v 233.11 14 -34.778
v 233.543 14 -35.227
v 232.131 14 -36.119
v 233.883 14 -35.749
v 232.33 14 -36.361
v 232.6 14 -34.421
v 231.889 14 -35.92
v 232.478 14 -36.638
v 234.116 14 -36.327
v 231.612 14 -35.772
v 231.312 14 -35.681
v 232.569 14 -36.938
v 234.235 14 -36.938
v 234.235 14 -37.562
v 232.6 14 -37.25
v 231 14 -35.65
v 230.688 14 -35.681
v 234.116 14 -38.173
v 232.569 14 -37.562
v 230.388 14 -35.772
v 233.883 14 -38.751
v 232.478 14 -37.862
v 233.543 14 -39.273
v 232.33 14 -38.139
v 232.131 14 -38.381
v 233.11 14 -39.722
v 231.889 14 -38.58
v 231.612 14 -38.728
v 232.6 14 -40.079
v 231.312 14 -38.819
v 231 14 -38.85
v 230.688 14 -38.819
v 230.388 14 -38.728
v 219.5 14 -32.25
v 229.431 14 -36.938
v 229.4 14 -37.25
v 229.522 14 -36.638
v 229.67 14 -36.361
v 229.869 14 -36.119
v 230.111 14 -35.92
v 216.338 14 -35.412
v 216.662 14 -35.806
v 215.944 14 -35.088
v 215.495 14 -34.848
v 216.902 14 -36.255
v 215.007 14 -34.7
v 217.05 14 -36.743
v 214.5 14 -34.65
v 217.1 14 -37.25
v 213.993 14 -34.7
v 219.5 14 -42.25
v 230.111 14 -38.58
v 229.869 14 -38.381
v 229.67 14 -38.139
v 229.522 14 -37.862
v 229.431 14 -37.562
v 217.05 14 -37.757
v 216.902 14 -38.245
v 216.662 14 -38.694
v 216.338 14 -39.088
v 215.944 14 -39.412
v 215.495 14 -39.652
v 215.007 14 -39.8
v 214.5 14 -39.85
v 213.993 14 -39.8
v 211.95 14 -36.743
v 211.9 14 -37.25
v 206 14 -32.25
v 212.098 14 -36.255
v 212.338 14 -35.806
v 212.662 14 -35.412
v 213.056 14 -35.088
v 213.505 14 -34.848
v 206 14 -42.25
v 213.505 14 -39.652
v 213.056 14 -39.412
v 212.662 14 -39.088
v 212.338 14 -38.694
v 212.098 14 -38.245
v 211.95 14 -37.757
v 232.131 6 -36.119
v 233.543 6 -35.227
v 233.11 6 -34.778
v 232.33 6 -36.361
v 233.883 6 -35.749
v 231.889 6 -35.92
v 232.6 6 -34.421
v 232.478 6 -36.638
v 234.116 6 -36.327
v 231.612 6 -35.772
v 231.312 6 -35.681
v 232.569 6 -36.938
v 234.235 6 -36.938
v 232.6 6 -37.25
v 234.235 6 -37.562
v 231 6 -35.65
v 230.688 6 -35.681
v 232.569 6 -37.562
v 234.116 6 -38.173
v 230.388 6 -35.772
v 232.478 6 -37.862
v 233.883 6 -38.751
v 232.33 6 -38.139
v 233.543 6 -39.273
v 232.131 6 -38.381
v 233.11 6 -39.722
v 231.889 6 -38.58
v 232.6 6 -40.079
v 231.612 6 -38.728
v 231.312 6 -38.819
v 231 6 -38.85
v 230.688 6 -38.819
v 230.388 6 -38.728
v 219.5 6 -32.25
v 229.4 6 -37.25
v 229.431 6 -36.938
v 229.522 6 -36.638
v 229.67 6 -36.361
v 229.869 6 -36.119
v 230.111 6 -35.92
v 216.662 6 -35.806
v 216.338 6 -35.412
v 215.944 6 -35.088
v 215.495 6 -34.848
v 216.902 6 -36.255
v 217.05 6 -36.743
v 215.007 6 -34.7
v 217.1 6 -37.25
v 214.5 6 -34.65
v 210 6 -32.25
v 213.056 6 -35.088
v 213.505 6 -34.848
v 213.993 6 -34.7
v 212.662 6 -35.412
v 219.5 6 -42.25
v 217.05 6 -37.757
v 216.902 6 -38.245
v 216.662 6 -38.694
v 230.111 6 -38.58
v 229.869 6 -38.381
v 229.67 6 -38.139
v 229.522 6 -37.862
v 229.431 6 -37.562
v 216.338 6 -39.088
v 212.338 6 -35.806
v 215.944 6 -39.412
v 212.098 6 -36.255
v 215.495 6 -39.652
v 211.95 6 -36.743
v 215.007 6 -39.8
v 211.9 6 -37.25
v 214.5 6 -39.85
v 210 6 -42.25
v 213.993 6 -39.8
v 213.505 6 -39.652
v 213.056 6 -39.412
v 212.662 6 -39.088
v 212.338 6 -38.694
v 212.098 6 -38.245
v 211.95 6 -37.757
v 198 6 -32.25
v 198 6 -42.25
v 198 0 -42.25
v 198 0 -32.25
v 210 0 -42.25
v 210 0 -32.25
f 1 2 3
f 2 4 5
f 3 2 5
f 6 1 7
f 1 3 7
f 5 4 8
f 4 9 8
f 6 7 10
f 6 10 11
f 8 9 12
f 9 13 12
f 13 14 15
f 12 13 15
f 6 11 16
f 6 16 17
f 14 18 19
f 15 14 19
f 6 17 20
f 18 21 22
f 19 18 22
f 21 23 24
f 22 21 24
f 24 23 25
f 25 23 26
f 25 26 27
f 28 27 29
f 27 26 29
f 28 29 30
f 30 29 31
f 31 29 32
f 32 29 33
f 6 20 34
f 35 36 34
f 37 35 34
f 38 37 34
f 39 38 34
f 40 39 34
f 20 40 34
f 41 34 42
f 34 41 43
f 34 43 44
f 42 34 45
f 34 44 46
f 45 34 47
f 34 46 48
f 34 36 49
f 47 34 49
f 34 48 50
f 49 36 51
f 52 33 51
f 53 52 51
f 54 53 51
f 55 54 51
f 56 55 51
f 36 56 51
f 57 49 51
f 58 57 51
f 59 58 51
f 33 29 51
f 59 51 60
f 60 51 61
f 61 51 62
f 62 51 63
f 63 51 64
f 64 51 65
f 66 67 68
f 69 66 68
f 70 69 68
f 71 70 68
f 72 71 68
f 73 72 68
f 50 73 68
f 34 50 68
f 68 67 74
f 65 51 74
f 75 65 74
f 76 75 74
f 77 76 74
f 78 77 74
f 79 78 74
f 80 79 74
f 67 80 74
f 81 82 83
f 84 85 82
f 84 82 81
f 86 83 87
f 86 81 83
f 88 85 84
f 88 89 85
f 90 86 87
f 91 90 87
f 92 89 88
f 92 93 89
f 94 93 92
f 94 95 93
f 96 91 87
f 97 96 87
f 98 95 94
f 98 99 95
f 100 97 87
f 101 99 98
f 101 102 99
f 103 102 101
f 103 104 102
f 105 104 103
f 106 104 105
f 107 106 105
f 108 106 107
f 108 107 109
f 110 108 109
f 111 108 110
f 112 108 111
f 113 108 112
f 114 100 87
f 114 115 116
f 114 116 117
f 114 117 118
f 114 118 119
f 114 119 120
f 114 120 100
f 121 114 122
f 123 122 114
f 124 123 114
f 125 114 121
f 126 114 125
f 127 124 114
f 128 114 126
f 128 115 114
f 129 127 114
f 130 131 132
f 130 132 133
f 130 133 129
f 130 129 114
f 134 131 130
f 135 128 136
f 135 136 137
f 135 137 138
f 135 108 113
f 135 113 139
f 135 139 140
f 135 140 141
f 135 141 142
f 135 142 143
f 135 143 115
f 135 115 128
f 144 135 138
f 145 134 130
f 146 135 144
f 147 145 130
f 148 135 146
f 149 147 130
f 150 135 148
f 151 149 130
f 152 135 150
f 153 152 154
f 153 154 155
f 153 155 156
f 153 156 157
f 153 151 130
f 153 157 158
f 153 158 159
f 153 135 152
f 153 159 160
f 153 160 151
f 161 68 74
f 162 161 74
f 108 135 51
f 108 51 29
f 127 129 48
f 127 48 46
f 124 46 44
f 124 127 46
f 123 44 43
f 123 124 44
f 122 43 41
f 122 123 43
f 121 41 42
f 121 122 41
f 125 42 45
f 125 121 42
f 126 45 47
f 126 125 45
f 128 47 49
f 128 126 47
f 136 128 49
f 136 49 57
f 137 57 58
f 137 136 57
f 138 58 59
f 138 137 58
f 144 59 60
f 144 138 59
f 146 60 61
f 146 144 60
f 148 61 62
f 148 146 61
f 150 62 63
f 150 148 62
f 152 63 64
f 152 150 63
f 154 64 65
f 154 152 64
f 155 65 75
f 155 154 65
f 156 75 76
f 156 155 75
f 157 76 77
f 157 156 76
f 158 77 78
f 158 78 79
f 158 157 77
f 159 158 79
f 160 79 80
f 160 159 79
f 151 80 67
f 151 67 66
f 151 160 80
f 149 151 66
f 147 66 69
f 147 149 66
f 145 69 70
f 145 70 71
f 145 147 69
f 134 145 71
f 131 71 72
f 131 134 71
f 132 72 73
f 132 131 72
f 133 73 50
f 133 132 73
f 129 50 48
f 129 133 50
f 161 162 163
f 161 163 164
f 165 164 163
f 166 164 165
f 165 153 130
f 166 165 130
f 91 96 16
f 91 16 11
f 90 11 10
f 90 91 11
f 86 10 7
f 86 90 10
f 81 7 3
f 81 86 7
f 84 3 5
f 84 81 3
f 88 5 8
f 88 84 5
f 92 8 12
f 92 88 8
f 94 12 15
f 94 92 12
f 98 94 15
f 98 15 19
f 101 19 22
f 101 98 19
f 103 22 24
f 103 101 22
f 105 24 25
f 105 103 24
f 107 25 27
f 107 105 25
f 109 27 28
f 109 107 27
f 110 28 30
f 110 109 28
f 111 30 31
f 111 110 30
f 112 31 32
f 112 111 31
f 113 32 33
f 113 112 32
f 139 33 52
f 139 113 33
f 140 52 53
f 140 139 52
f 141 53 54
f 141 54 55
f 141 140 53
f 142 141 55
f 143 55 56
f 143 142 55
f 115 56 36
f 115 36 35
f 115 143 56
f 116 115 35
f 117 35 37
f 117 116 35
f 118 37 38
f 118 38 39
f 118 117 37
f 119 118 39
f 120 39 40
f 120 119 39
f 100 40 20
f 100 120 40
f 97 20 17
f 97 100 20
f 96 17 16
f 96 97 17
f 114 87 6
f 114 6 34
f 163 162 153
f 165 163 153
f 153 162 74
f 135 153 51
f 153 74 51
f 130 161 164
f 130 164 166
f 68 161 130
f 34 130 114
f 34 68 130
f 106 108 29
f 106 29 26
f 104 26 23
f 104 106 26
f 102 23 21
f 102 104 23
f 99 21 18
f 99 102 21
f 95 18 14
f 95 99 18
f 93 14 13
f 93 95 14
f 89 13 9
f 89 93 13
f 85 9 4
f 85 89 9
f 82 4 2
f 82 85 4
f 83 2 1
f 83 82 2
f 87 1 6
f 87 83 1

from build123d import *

# Parameters (mm, degrees)
SKETCH1_R             = 5.9875
SKETCH1_R_2           = 1.7
SKETCH1_R_3           = 1.6
BOSS_EXTRUDE1_DEPTH   = 6
MOVE_FACE1_BY         = 5
MOVE_FACE1_2_BY       = 5
MOVE_FACE1_3_BY       = 5
MOVE_FACE1_4_BY       = 5
M4X0_7_TAPPED_HOLE2_D = 3.3
POCKET_WALLS_DEPTH    = 2.6
RIB_PATTERN_DEPTH     = 3
MOVE_FACE2_BY         = 4.5
MOVE_FACE2_2_BY       = 4.5
MOVE_FACE2_3_BY       = 4.5
MOVE_FACE2_4_BY       = 4.5
MOVE_FACE2_5_BY       = 4.5
MOVE_FACE2_6_BY       = 4.5
MOVE_FACE2_7_BY       = 4.5
MOVE_FACE2_8_BY       = 4.5
MOVE_FACE2_9_BY       = 4.5
MOVE_FACE2_10_BY      = 4.5
MOVE_FACE2_11_BY      = 4.5
MOVE_FACE2_12_BY      = 4.5
MOVE_FACE2_13_BY      = 4.5
MOVE_FACE2_14_BY      = 4.5
BOSS_EXTRUDE6_REACH   = 382.427
SKETCH19_W            = 1
SKETCH19_H            = 3
BOSS_EXTRUDE7_REACH   = 375.768
SKETCH20_W            = 1
SKETCH20_H            = 3
CUT_EXTRUDE4_DEPTH    = 4.5
POCKET_FILLETS_R      = 2.5
FILLET9_R             = 3
MOVE_FACE3_BY         = 12
MOVE_FACE3_2_BY       = 12
SKETCH23_W            = 12
SKETCH23_H            = 38.175
CUT_EXTRUDE5_DEPTH    = 245.489391385
MOVE_FACE4_BY         = 4
MOVE_FACE4_2_BY       = 4
FILLET6_R             = 5
FILLET7_R             = 11
FILLET8_START         = -1
FILLET8_DEPTH         = 8
FILLET8_2_DEPTH       = 6
SKETCH25_R            = 1.6
SKETCH25_R_2          = 2.6
BOSS_EXTRUDE9_DEPTH   = 8
SKETCH26_W            = 12
SKETCH26_H            = 10
BOSS_EXTRUDE10_DEPTH  = 6
CHAMFER2_SIZE         = 8


with BuildPart() as part:
    # Sketch1 → Boss-Extrude1 (new body)
    with BuildSketch(Plane(origin=(0, 0, 0), x_dir=(1, 0, 0), z_dir=(0, 1, 0))):
        Polygon((-240, 46.25), (-198, 46.25), (-198, 26.5), (198, 26.5), (198, 46.25), (240, 46.25), (240, -18.75), (201, -18.75), (201, 0), (-201, 0), (-201, -18.75), (-240, -18.75), align=None)
        with Locations(Location((-231, 24.425, 0), (0, 0, 270))):
            Circle(SKETCH1_R, mode=Mode.SUBTRACT)
        with Locations(Location((-214.5, 37.25, 0), (0, 0, 270))):
            Circle(SKETCH1_R, mode=Mode.SUBTRACT)
        with Locations(Location((214.5, 37.25, 0), (0, 0, 90))):
            Circle(SKETCH1_R, mode=Mode.SUBTRACT)
        with Locations(Location((231, 24.425, 0), (0, 0, 90))):
            Circle(SKETCH1_R, mode=Mode.SUBTRACT)
        with Locations(Location((-204.5, -6.05, 0), (0, 0, 270))):
            Circle(SKETCH1_R_2, mode=Mode.SUBTRACT)
        with Locations(Location((-224.5, -6.05, 0), (0, 0, 270))):
            Circle(SKETCH1_R_2, mode=Mode.SUBTRACT)
        with Locations(Location((-204.5, 13.95, 0), (0, 0, 270))):
            Circle(SKETCH1_R_2, mode=Mode.SUBTRACT)
        with Locations(Location((-224.5, 13.95, 0), (0, 0, 270))):
            Circle(SKETCH1_R_2, mode=Mode.SUBTRACT)
        with Locations(Location((204.5, -6.05, 0), (0, 0, 90))):
            Circle(SKETCH1_R_2, mode=Mode.SUBTRACT)
        with Locations(Location((204.5, 13.95, 0), (0, 0, 90))):
            Circle(SKETCH1_R_2, mode=Mode.SUBTRACT)
        with Locations(Location((224.5, 13.95, 0), (0, 0, 90))):
            Circle(SKETCH1_R_2, mode=Mode.SUBTRACT)
        with Locations(Location((224.5, -6.05, 0), (0, 0, 90))):
            Circle(SKETCH1_R_2, mode=Mode.SUBTRACT)
        with Locations(Location((-187.5, 13.25, 0), (0, 0, 270))):
            Circle(SKETCH1_R_3, mode=Mode.SUBTRACT)
        with Locations(Location((-162.5, 13.25, 0), (0, 0, 270))):
            Circle(SKETCH1_R_3, mode=Mode.SUBTRACT)
        with Locations(Location((-137.5, 13.25, 0), (0, 0, 270))):
            Circle(SKETCH1_R_3, mode=Mode.SUBTRACT)
        with Locations(Location((-112.5, 13.25, 0), (0, 0, 270))):
            Circle(SKETCH1_R_3, mode=Mode.SUBTRACT)
        with Locations(Location((-87.5, 13.25, 0), (0, 0, 270))):
            Circle(SKETCH1_R_3, mode=Mode.SUBTRACT)
        with Locations(Location((-62.5, 13.25, 0), (0, 0, 270))):
            Circle(SKETCH1_R_3, mode=Mode.SUBTRACT)
        with Locations(Location((-37.5, 13.25, 0), (0, 0, 270))):
            Circle(SKETCH1_R_3, mode=Mode.SUBTRACT)
        with Locations(Location((-12.5, 13.25, 0), (0, 0, 270))):
            Circle(SKETCH1_R_3, mode=Mode.SUBTRACT)
        with Locations(Location((12.5, 13.25, 0), (0, 0, 270))):
            Circle(SKETCH1_R_3, mode=Mode.SUBTRACT)
        with Locations(Location((37.5, 13.25, 0), (0, 0, 270))):
            Circle(SKETCH1_R_3, mode=Mode.SUBTRACT)
        with Locations(Location((62.5, 13.25, 0), (0, 0, 270))):
            Circle(SKETCH1_R_3, mode=Mode.SUBTRACT)
        with Locations(Location((87.5, 13.25, 0), (0, 0, 270))):
            Circle(SKETCH1_R_3, mode=Mode.SUBTRACT)
        with Locations(Location((112.5, 13.25, 0), (0, 0, 270))):
            Circle(SKETCH1_R_3, mode=Mode.SUBTRACT)
        with Locations(Location((137.5, 13.25, 0), (0, 0, 270))):
            Circle(SKETCH1_R_3, mode=Mode.SUBTRACT)
        with Locations(Location((-231, 37.25, 0), (0, 0, 270))):
            Circle(SKETCH1_R_3, mode=Mode.SUBTRACT)
        with Locations(Location((231, 37.25, 0), (0, 0, 90))):
            Circle(SKETCH1_R_3, mode=Mode.SUBTRACT)
        with Locations(Location((162.5, 13.25, 0), (0, 0, 270))):
            Circle(SKETCH1_R_3, mode=Mode.SUBTRACT)
        with Locations(Location((187.5, 13.25, 0), (0, 0, 270))):
            Circle(SKETCH1_R_3, mode=Mode.SUBTRACT)
    extrude(amount=BOSS_EXTRUDE1_DEPTH)

    # Move Face1: a curved face moved outward by 5.0
    add(Solid.thicken(part.faces().sort_by_distance((231, 3, -18.4375))[0], MOVE_FACE1_BY))

    # Move Face1 2: a curved face moved outward by 5.0
    add(Solid.thicken(part.faces().sort_by_distance((214.5, 3, -31.2625))[0], MOVE_FACE1_2_BY))

    # Move Face1 3: a curved face moved outward by 5.0
    add(Solid.thicken(part.faces().sort_by_distance((-214.5, 3, -43.2375))[0], MOVE_FACE1_3_BY))

    # Move Face1 4: a curved face moved outward by 5.0
    add(Solid.thicken(part.faces().sort_by_distance((-231, 3, -30.4125))[0], MOVE_FACE1_4_BY))

    # M4x0.7 Tapped Hole2 (through all)
    with Locations(Plane(origin=(0, 6, 0), x_dir=(1, 0, 0), z_dir=(0, 1, 0))):
        with Locations((-214.5, 37.25), (-231, 24.425), (231, 24.425), (214.5, 37.25)):
            Hole(M4X0_7_TAPPED_HOLE2_D / 2)

    # Sketch13 → Pocket Walls (add)
    with BuildSketch(Plane.XY):
        Polygon((-214, 6), (-208.803847577, 9), (208.803847577, 9), (214, 6), align=None)
    pocket_walls = extrude(amount=-POCKET_WALLS_DEPTH)

    # Mirror1: Pocket Walls across plane
    add(pocket_walls.mirror(Plane.XY.offset(-13.25)))

    # zig_zag_style_1 → Rib Pattern (add)
    with BuildSketch(Plane(origin=(0, 6, 0), x_dir=(1, 0, 0), z_dir=(0, 1, 0))):
        Polygon((-186.851468198, 1.838812439), (-162.5, 22.586263345), (-137.5, 1.286263345), (-112.5, 22.586263345), (-87.5, 1.286263345), (-62.5, 22.586263345), (-37.5, 1.286263345), (-12.5, 22.586263345), (12.5, 1.286263345), (37.5, 22.586263345), (62.5, 1.286263345), (87.5, 22.586263345), (112.5, 1.286263345), (137.5, 22.586263345), (162.5, 1.286263345), (188.148531802, 23.138812439), (186.851468198, 24.661187561), (162.5, 3.913736655), (137.5, 25.213736655), (112.5, 3.913736655), (87.5, 25.213736655), (62.5, 3.913736655), (37.5, 25.213736655), (12.5, 3.913736655), (-12.5, 25.213736655), (-37.5, 3.913736655), (-62.5, 25.213736655), (-87.5, 3.913736655), (-112.5, 25.213736655), (-137.5, 3.913736655), (-162.5, 25.213736655), (-188.148531802, 3.361187561), align=None)
    extrude(amount=RIB_PATTERN_DEPTH)

    # Move Face2: a face moved inward by 4.5
    extrude(part.faces().sort_by_distance((162.5, 6, -17.307514961))[0], amount=MOVE_FACE2_BY, dir=(0, -1, 0), mode=Mode.SUBTRACT)

    # Move Face2 2: a face moved inward by 4.5
    extrude(part.faces().sort_by_distance((137.5, 6, -9.192485039))[0], amount=MOVE_FACE2_2_BY, dir=(0, -1, 0), mode=Mode.SUBTRACT)

    # Move Face2 3: a face moved inward by 4.5
    extrude(part.faces().sort_by_distance((112.5, 6, -17.307514961))[0], amount=MOVE_FACE2_3_BY, dir=(0, -1, 0), mode=Mode.SUBTRACT)

    # Move Face2 4: a face moved inward by 4.5
    extrude(part.faces().sort_by_distance((87.5, 6, -9.192485039))[0], amount=MOVE_FACE2_4_BY, dir=(0, -1, 0), mode=Mode.SUBTRACT)

    # Move Face2 5: a face moved inward by 4.5
    extrude(part.faces().sort_by_distance((62.5, 6, -17.307514961))[0], amount=MOVE_FACE2_5_BY, dir=(0, -1, 0), mode=Mode.SUBTRACT)

    # Move Face2 6: a face moved inward by 4.5
    extrude(part.faces().sort_by_distance((37.5, 6, -9.192485039))[0], amount=MOVE_FACE2_6_BY, dir=(0, -1, 0), mode=Mode.SUBTRACT)

    # Move Face2 7: a face moved inward by 4.5
    extrude(part.faces().sort_by_distance((12.5, 6, -17.307514961))[0], amount=MOVE_FACE2_7_BY, dir=(0, -1, 0), mode=Mode.SUBTRACT)

    # Move Face2 8: a face moved inward by 4.5
    extrude(part.faces().sort_by_distance((-12.5, 6, -9.192485039))[0], amount=MOVE_FACE2_8_BY, dir=(0, -1, 0), mode=Mode.SUBTRACT)

    # Move Face2 9: a face moved inward by 4.5
    extrude(part.faces().sort_by_distance((-37.5, 6, -17.307514961))[0], amount=MOVE_FACE2_9_BY, dir=(0, -1, 0), mode=Mode.SUBTRACT)

    # Move Face2 10: a face moved inward by 4.5
    extrude(part.faces().sort_by_distance((-62.5, 6, -9.192485039))[0], amount=MOVE_FACE2_10_BY, dir=(0, -1, 0), mode=Mode.SUBTRACT)

    # Move Face2 11: a face moved inward by 4.5
    extrude(part.faces().sort_by_distance((-87.5, 6, -17.307514961))[0], amount=MOVE_FACE2_11_BY, dir=(0, -1, 0), mode=Mode.SUBTRACT)

    # Move Face2 12: a face moved inward by 4.5
    extrude(part.faces().sort_by_distance((-112.5, 6, -9.192485039))[0], amount=MOVE_FACE2_12_BY, dir=(0, -1, 0), mode=Mode.SUBTRACT)

    # Move Face2 13: a face moved inward by 4.5
    extrude(part.faces().sort_by_distance((-162.5, 6, -9.192485039))[0], amount=MOVE_FACE2_13_BY, dir=(0, -1, 0), mode=Mode.SUBTRACT)

    # Move Face2 14: a face moved inward by 4.5
    extrude(part.faces().sort_by_distance((-137.5, 6, -17.307514961))[0], amount=MOVE_FACE2_14_BY, dir=(0, -1, 0), mode=Mode.SUBTRACT)

    # Boss-Extrude6: up to this face of the body (flat: up to its plane)
    boss_extrude6_end = Plane(part.part.faces().sort_by_distance((199.498029235, 7.445651316, -23.9))[0])
    # Sketch19 → Boss-Extrude6 (add, up to the picked face)
    with BuildSketch(Plane(origin=(120.437057913, 0, -102.612373342), x_dir=(-0.6485318015860708, 0, -0.7611875605470214), z_dir=(0.7611875605470213, 0, -0.6485318015860707)), mode=Mode.PRIVATE) as boss_extrude6_sk1:
        with Locations((-103.9073301, 7.5)):
            Rectangle(SKETCH19_W, SKETCH19_H)
    boss_extrude6_tool1 = split(extrude(boss_extrude6_sk1.sketch, amount=BOSS_EXTRUDE6_REACH, mode=Mode.PRIVATE), bisect_by=boss_extrude6_end, keep=Keep.BOTH, mode=Mode.PRIVATE)
    add(boss_extrude6_tool1.solids().sort_by(Axis((187.824266, 7.5, -23.519406), (0.7611875605470213, 0, -0.6485318015860707)))[0])

    # Boss-Extrude7: up to this face of the body (flat: up to its plane)
    boss_extrude7_end = Plane(part.part.faces().sort_by_distance((-199.498029235, 7.445651316, -2.6))[0])
    # Sketch20 → Boss-Extrude7 (add, up to the picked face)
    with BuildSketch(Plane(origin=(-107.355217903, 0, 91.466645654), x_dir=(0.6485318015860708, 0, 0.7611875605470213), z_dir=(-0.7611875605470213, 0, 0.6485318015860708)), mode=Mode.PRIVATE) as boss_extrude7_sk1:
        with Locations((-124.078800455, 7.5)):
            Rectangle(SKETCH20_W, SKETCH20_H)
    boss_extrude7_tool1 = split(extrude(boss_extrude7_sk1.sketch, amount=BOSS_EXTRUDE7_REACH, mode=Mode.PRIVATE), bisect_by=boss_extrude7_end, keep=Keep.BOTH, mode=Mode.PRIVATE)
    add(boss_extrude7_tool1.solids().sort_by(Axis((-187.824266, 7.5, -2.980594), (-0.7611875605470213, 0, 0.6485318015860708)))[0])

    # Sketch22 → Cut-Extrude4 (cut)
    with BuildSketch(Plane(origin=(0, 6, 0), x_dir=(1, 0, 0), z_dir=(0, 1, 0))):
        Polygon((-201, 2.6), (-201, 23.9), (-164.041944431, 23.9), (-189.041944431, 2.6), align=None)
        Polygon((201, 2.6), (201, 23.9), (189.041944431, 23.9), (164.041944431, 2.6), align=None)
    extrude(amount=-CUT_EXTRUDE4_DEPTH, mode=Mode.SUBTRACT)

    # Pocket FIllets
    pocket_fillets_edges = [part.edges().sort_by_distance(p)[0] for p in [
        (185.958055569, 5.25, -23.9),
        (139.041944431, 5.25, -23.9),
        (135.958055569, 5.25, -23.9),
        (89.041944431, 5.25, -23.9),
        (85.958055569, 5.25, -23.9),
        (39.041944431, 5.25, -23.9),
        (35.958055569, 5.25, -23.9),
        (-10.958055569, 5.25, -23.9),
        (-14.041944431, 5.25, -23.9),
        (-60.958055569, 5.25, -23.9),
        (-64.041944431, 5.25, -23.9),
        (-110.958055569, 5.25, -23.9),
        (-114.041944431, 5.25, -23.9),
        (-160.958055569, 5.25, -23.9),
        (-164.041944431, 5.25, -23.9),
        (164.041944431, 5.25, -2.6),
        (-185.958055569, 5.25, -2.6),
        (-139.041944431, 5.25, -2.6),
        (-135.958055569, 5.25, -2.6),
        (-89.041944431, 5.25, -2.6),
        (-85.958055569, 5.25, -2.6),
        (-39.041944431, 5.25, -2.6),
        (-35.958055569, 5.25, -2.6),
        (10.958055569, 5.25, -2.6),
        (14.041944431, 5.25, -2.6),
        (60.958055569, 5.25, -2.6),
        (64.041944431, 5.25, -2.6),
        (110.958055569, 5.25, -2.6),
        (114.041944431, 5.25, -2.6),
        (160.958055569, 5.25, -2.6),
        (137.5, 5.25, -22.586263345),
        (87.5, 5.25, -22.586263345),
        (37.5, 5.25, -22.586263345),
        (-12.5, 5.25, -22.586263345),
        (-62.5, 5.25, -22.586263345),
        (-112.5, 5.25, -22.586263345),
        (-162.5, 5.25, -22.586263345),
        (-137.5, 5.25, -3.913736655),
        (-87.5, 5.25, -3.913736655),
        (-37.5, 5.25, -3.913736655),
        (12.5, 5.25, -3.913736655),
        (62.5, 5.25, -3.913736655),
        (112.5, 5.25, -3.913736655),
        (162.5, 5.25, -3.913736655),
        (189.041944431, 5.25, -23.9),
        (-189.041944431, 5.25, -2.6),
    ]]
    fillet(pocket_fillets_edges, radius=POCKET_FILLETS_R)

    # Fillet9
    fillet9_edges = [part.edges().sort_by_distance(p)[0] for p in [
        (-201, 3.75, -2.6),
        (-201, 3.75, -23.9),
        (201, 3.75, -2.6),
        (201, 3.75, -23.9),
    ]]
    fillet(fillet9_edges, radius=FILLET9_R)

    # Move Face3: a face moved inward by 12.0
    extrude(part.faces().sort_by_distance((198, 3, -36.375))[0], amount=MOVE_FACE3_BY, dir=(1, 0, 0), mode=Mode.SUBTRACT)

    # Move Face3 2: a face moved inward by 12.0
    extrude(part.faces().sort_by_distance((-198, 3, -36.375))[0], amount=MOVE_FACE3_2_BY, dir=(-1, 0, 0), mode=Mode.SUBTRACT)

    # Sketch23 → Cut-Extrude5 (cut, through all)
    with BuildSketch(Plane(origin=(0, 6, 0), x_dir=(1, 0, 0), z_dir=(0, 1, 0))):
        with Locations((-234, 0.3375)):
            Rectangle(SKETCH23_W, SKETCH23_H)
        with Locations((234, 0.3375)):
            Rectangle(SKETCH23_W, SKETCH23_H)
    extrude(amount=-CUT_EXTRUDE5_DEPTH, mode=Mode.SUBTRACT)

    # Move Face4: a face moved inward by 4.0
    extrude(part.faces().sort_by_distance((-240, 3, -32.8375))[0], amount=MOVE_FACE4_BY, dir=(1, 0, 0), mode=Mode.SUBTRACT)

    # Move Face4 2: a face moved inward by 4.0
    extrude(part.faces().sort_by_distance((240, 3, -32.8375))[0], amount=MOVE_FACE4_2_BY, dir=(-1, 0, 0), mode=Mode.SUBTRACT)

    # Fillet6
    fillet6_edges = [part.edges().sort_by_distance(p)[0] for p in [
        (-210, 3, -46.25),
        (-210, 3, -26.5),
        (210, 3, -26.5),
        (210, 3, -46.25),
        (201, 3, 18.75),
        (201, 3, 0),
        (-201, 3, 0),
        (-201, 3, 18.75),
        (-228, 3, 18.75),
        (228, 3, 18.75),
    ]]
    fillet(fillet6_edges, radius=FILLET6_R)

    # Fillet7
    fillet7_edges = [part.edges().sort_by_distance(p)[0] for p in [
        (-236, 3, -46.25),
        (236, 3, -46.25),
    ]]
    fillet(fillet7_edges, radius=FILLET7_R)

    # Fillet8: read off the stored shape, not the designer's step
    # Fillet8 outline → Fillet8 (cut)
    with BuildSketch(Plane(origin=(0, 0, 0), x_dir=(1, 0, 0), z_dir=(0, 1, 0)).offset(FILLET8_START)):
        with BuildLine():
            Line((-236, 19.425), (-232, 19.425))
            ThreePointArc((-232, 19.425), (-234.828427125, 20.596572875), (-236, 23.425))
            Line((-236, 23.425), (-236, 19.425))
        make_face()
        with BuildLine():
            ThreePointArc((236, 23.425), (234.828427125, 20.596572875), (232, 19.425))
            Line((232, 19.425), (236, 19.425))
            Line((236, 19.425), (236, 23.425))
        make_face()
    extrude(amount=FILLET8_DEPTH, mode=Mode.SUBTRACT)

    # Fillet8 2 outline → Fillet8 2 (add)
    with BuildSketch(Plane(origin=(0, 0, 0), x_dir=(1, 0, 0), z_dir=(0, 1, 0))):
        with BuildLine():
            Line((-228, 19.425), (-232, 19.425))
            ThreePointArc((-232, 19.425), (-229.171572875, 18.253427125), (-228, 15.425))
            Line((-228, 15.425), (-228, 19.425))
        make_face()
        with BuildLine():
            Line((228, 19.425), (228, 15.425))
            ThreePointArc((228, 15.425), (229.171572875, 18.253427125), (232, 19.425))
            Line((232, 19.425), (228, 19.425))
        make_face()
    extrude(amount=FILLET8_2_DEPTH)


with BuildPart() as body_2:
    # Sketch25 → Boss-Extrude9 (new body)
    with BuildSketch(Plane(origin=(0, 6, 0), x_dir=(1, 0, 0), z_dir=(0, 1, 0))):
        with BuildLine():
            Line((198, 32.25), (198, 42.25))
            Line((198, 42.25), (219.5, 42.25))
            Line((219.5, 42.25), (232.6, 40.078869032))
            ThreePointArc((232.6, 40.078869032), (234.25, 37.25), (232.6, 34.421130968))
            Line((232.6, 34.421130968), (219.5, 32.25))
            Line((219.5, 32.25), (198, 32.25))
        make_face()
        with Locations(Location((231, 37.25, 0), (0, 0, 270))):
            Circle(SKETCH25_R, mode=Mode.SUBTRACT)
        with Locations(Location((214.5, 37.25, 0), (0, 0, 270))):
            Circle(SKETCH25_R_2, mode=Mode.SUBTRACT)
    extrude(amount=BOSS_EXTRUDE9_DEPTH)

    # Sketch26 → Boss-Extrude10 (add)
    with BuildSketch(Plane.XZ.offset(-6)):
        with Locations((204, -37.25)):
            Rectangle(SKETCH26_W, SKETCH26_H)
    extrude(amount=BOSS_EXTRUDE10_DEPTH)

    # Chamfer2
    chamfer2_edges = [body_2.edges().sort_by_distance(p)[0] for p in [
        (198, 14, -37.25),
    ]]
    chamfer(chamfer2_edges, length=CHAMFER2_SIZE)


solid = body_2.part
